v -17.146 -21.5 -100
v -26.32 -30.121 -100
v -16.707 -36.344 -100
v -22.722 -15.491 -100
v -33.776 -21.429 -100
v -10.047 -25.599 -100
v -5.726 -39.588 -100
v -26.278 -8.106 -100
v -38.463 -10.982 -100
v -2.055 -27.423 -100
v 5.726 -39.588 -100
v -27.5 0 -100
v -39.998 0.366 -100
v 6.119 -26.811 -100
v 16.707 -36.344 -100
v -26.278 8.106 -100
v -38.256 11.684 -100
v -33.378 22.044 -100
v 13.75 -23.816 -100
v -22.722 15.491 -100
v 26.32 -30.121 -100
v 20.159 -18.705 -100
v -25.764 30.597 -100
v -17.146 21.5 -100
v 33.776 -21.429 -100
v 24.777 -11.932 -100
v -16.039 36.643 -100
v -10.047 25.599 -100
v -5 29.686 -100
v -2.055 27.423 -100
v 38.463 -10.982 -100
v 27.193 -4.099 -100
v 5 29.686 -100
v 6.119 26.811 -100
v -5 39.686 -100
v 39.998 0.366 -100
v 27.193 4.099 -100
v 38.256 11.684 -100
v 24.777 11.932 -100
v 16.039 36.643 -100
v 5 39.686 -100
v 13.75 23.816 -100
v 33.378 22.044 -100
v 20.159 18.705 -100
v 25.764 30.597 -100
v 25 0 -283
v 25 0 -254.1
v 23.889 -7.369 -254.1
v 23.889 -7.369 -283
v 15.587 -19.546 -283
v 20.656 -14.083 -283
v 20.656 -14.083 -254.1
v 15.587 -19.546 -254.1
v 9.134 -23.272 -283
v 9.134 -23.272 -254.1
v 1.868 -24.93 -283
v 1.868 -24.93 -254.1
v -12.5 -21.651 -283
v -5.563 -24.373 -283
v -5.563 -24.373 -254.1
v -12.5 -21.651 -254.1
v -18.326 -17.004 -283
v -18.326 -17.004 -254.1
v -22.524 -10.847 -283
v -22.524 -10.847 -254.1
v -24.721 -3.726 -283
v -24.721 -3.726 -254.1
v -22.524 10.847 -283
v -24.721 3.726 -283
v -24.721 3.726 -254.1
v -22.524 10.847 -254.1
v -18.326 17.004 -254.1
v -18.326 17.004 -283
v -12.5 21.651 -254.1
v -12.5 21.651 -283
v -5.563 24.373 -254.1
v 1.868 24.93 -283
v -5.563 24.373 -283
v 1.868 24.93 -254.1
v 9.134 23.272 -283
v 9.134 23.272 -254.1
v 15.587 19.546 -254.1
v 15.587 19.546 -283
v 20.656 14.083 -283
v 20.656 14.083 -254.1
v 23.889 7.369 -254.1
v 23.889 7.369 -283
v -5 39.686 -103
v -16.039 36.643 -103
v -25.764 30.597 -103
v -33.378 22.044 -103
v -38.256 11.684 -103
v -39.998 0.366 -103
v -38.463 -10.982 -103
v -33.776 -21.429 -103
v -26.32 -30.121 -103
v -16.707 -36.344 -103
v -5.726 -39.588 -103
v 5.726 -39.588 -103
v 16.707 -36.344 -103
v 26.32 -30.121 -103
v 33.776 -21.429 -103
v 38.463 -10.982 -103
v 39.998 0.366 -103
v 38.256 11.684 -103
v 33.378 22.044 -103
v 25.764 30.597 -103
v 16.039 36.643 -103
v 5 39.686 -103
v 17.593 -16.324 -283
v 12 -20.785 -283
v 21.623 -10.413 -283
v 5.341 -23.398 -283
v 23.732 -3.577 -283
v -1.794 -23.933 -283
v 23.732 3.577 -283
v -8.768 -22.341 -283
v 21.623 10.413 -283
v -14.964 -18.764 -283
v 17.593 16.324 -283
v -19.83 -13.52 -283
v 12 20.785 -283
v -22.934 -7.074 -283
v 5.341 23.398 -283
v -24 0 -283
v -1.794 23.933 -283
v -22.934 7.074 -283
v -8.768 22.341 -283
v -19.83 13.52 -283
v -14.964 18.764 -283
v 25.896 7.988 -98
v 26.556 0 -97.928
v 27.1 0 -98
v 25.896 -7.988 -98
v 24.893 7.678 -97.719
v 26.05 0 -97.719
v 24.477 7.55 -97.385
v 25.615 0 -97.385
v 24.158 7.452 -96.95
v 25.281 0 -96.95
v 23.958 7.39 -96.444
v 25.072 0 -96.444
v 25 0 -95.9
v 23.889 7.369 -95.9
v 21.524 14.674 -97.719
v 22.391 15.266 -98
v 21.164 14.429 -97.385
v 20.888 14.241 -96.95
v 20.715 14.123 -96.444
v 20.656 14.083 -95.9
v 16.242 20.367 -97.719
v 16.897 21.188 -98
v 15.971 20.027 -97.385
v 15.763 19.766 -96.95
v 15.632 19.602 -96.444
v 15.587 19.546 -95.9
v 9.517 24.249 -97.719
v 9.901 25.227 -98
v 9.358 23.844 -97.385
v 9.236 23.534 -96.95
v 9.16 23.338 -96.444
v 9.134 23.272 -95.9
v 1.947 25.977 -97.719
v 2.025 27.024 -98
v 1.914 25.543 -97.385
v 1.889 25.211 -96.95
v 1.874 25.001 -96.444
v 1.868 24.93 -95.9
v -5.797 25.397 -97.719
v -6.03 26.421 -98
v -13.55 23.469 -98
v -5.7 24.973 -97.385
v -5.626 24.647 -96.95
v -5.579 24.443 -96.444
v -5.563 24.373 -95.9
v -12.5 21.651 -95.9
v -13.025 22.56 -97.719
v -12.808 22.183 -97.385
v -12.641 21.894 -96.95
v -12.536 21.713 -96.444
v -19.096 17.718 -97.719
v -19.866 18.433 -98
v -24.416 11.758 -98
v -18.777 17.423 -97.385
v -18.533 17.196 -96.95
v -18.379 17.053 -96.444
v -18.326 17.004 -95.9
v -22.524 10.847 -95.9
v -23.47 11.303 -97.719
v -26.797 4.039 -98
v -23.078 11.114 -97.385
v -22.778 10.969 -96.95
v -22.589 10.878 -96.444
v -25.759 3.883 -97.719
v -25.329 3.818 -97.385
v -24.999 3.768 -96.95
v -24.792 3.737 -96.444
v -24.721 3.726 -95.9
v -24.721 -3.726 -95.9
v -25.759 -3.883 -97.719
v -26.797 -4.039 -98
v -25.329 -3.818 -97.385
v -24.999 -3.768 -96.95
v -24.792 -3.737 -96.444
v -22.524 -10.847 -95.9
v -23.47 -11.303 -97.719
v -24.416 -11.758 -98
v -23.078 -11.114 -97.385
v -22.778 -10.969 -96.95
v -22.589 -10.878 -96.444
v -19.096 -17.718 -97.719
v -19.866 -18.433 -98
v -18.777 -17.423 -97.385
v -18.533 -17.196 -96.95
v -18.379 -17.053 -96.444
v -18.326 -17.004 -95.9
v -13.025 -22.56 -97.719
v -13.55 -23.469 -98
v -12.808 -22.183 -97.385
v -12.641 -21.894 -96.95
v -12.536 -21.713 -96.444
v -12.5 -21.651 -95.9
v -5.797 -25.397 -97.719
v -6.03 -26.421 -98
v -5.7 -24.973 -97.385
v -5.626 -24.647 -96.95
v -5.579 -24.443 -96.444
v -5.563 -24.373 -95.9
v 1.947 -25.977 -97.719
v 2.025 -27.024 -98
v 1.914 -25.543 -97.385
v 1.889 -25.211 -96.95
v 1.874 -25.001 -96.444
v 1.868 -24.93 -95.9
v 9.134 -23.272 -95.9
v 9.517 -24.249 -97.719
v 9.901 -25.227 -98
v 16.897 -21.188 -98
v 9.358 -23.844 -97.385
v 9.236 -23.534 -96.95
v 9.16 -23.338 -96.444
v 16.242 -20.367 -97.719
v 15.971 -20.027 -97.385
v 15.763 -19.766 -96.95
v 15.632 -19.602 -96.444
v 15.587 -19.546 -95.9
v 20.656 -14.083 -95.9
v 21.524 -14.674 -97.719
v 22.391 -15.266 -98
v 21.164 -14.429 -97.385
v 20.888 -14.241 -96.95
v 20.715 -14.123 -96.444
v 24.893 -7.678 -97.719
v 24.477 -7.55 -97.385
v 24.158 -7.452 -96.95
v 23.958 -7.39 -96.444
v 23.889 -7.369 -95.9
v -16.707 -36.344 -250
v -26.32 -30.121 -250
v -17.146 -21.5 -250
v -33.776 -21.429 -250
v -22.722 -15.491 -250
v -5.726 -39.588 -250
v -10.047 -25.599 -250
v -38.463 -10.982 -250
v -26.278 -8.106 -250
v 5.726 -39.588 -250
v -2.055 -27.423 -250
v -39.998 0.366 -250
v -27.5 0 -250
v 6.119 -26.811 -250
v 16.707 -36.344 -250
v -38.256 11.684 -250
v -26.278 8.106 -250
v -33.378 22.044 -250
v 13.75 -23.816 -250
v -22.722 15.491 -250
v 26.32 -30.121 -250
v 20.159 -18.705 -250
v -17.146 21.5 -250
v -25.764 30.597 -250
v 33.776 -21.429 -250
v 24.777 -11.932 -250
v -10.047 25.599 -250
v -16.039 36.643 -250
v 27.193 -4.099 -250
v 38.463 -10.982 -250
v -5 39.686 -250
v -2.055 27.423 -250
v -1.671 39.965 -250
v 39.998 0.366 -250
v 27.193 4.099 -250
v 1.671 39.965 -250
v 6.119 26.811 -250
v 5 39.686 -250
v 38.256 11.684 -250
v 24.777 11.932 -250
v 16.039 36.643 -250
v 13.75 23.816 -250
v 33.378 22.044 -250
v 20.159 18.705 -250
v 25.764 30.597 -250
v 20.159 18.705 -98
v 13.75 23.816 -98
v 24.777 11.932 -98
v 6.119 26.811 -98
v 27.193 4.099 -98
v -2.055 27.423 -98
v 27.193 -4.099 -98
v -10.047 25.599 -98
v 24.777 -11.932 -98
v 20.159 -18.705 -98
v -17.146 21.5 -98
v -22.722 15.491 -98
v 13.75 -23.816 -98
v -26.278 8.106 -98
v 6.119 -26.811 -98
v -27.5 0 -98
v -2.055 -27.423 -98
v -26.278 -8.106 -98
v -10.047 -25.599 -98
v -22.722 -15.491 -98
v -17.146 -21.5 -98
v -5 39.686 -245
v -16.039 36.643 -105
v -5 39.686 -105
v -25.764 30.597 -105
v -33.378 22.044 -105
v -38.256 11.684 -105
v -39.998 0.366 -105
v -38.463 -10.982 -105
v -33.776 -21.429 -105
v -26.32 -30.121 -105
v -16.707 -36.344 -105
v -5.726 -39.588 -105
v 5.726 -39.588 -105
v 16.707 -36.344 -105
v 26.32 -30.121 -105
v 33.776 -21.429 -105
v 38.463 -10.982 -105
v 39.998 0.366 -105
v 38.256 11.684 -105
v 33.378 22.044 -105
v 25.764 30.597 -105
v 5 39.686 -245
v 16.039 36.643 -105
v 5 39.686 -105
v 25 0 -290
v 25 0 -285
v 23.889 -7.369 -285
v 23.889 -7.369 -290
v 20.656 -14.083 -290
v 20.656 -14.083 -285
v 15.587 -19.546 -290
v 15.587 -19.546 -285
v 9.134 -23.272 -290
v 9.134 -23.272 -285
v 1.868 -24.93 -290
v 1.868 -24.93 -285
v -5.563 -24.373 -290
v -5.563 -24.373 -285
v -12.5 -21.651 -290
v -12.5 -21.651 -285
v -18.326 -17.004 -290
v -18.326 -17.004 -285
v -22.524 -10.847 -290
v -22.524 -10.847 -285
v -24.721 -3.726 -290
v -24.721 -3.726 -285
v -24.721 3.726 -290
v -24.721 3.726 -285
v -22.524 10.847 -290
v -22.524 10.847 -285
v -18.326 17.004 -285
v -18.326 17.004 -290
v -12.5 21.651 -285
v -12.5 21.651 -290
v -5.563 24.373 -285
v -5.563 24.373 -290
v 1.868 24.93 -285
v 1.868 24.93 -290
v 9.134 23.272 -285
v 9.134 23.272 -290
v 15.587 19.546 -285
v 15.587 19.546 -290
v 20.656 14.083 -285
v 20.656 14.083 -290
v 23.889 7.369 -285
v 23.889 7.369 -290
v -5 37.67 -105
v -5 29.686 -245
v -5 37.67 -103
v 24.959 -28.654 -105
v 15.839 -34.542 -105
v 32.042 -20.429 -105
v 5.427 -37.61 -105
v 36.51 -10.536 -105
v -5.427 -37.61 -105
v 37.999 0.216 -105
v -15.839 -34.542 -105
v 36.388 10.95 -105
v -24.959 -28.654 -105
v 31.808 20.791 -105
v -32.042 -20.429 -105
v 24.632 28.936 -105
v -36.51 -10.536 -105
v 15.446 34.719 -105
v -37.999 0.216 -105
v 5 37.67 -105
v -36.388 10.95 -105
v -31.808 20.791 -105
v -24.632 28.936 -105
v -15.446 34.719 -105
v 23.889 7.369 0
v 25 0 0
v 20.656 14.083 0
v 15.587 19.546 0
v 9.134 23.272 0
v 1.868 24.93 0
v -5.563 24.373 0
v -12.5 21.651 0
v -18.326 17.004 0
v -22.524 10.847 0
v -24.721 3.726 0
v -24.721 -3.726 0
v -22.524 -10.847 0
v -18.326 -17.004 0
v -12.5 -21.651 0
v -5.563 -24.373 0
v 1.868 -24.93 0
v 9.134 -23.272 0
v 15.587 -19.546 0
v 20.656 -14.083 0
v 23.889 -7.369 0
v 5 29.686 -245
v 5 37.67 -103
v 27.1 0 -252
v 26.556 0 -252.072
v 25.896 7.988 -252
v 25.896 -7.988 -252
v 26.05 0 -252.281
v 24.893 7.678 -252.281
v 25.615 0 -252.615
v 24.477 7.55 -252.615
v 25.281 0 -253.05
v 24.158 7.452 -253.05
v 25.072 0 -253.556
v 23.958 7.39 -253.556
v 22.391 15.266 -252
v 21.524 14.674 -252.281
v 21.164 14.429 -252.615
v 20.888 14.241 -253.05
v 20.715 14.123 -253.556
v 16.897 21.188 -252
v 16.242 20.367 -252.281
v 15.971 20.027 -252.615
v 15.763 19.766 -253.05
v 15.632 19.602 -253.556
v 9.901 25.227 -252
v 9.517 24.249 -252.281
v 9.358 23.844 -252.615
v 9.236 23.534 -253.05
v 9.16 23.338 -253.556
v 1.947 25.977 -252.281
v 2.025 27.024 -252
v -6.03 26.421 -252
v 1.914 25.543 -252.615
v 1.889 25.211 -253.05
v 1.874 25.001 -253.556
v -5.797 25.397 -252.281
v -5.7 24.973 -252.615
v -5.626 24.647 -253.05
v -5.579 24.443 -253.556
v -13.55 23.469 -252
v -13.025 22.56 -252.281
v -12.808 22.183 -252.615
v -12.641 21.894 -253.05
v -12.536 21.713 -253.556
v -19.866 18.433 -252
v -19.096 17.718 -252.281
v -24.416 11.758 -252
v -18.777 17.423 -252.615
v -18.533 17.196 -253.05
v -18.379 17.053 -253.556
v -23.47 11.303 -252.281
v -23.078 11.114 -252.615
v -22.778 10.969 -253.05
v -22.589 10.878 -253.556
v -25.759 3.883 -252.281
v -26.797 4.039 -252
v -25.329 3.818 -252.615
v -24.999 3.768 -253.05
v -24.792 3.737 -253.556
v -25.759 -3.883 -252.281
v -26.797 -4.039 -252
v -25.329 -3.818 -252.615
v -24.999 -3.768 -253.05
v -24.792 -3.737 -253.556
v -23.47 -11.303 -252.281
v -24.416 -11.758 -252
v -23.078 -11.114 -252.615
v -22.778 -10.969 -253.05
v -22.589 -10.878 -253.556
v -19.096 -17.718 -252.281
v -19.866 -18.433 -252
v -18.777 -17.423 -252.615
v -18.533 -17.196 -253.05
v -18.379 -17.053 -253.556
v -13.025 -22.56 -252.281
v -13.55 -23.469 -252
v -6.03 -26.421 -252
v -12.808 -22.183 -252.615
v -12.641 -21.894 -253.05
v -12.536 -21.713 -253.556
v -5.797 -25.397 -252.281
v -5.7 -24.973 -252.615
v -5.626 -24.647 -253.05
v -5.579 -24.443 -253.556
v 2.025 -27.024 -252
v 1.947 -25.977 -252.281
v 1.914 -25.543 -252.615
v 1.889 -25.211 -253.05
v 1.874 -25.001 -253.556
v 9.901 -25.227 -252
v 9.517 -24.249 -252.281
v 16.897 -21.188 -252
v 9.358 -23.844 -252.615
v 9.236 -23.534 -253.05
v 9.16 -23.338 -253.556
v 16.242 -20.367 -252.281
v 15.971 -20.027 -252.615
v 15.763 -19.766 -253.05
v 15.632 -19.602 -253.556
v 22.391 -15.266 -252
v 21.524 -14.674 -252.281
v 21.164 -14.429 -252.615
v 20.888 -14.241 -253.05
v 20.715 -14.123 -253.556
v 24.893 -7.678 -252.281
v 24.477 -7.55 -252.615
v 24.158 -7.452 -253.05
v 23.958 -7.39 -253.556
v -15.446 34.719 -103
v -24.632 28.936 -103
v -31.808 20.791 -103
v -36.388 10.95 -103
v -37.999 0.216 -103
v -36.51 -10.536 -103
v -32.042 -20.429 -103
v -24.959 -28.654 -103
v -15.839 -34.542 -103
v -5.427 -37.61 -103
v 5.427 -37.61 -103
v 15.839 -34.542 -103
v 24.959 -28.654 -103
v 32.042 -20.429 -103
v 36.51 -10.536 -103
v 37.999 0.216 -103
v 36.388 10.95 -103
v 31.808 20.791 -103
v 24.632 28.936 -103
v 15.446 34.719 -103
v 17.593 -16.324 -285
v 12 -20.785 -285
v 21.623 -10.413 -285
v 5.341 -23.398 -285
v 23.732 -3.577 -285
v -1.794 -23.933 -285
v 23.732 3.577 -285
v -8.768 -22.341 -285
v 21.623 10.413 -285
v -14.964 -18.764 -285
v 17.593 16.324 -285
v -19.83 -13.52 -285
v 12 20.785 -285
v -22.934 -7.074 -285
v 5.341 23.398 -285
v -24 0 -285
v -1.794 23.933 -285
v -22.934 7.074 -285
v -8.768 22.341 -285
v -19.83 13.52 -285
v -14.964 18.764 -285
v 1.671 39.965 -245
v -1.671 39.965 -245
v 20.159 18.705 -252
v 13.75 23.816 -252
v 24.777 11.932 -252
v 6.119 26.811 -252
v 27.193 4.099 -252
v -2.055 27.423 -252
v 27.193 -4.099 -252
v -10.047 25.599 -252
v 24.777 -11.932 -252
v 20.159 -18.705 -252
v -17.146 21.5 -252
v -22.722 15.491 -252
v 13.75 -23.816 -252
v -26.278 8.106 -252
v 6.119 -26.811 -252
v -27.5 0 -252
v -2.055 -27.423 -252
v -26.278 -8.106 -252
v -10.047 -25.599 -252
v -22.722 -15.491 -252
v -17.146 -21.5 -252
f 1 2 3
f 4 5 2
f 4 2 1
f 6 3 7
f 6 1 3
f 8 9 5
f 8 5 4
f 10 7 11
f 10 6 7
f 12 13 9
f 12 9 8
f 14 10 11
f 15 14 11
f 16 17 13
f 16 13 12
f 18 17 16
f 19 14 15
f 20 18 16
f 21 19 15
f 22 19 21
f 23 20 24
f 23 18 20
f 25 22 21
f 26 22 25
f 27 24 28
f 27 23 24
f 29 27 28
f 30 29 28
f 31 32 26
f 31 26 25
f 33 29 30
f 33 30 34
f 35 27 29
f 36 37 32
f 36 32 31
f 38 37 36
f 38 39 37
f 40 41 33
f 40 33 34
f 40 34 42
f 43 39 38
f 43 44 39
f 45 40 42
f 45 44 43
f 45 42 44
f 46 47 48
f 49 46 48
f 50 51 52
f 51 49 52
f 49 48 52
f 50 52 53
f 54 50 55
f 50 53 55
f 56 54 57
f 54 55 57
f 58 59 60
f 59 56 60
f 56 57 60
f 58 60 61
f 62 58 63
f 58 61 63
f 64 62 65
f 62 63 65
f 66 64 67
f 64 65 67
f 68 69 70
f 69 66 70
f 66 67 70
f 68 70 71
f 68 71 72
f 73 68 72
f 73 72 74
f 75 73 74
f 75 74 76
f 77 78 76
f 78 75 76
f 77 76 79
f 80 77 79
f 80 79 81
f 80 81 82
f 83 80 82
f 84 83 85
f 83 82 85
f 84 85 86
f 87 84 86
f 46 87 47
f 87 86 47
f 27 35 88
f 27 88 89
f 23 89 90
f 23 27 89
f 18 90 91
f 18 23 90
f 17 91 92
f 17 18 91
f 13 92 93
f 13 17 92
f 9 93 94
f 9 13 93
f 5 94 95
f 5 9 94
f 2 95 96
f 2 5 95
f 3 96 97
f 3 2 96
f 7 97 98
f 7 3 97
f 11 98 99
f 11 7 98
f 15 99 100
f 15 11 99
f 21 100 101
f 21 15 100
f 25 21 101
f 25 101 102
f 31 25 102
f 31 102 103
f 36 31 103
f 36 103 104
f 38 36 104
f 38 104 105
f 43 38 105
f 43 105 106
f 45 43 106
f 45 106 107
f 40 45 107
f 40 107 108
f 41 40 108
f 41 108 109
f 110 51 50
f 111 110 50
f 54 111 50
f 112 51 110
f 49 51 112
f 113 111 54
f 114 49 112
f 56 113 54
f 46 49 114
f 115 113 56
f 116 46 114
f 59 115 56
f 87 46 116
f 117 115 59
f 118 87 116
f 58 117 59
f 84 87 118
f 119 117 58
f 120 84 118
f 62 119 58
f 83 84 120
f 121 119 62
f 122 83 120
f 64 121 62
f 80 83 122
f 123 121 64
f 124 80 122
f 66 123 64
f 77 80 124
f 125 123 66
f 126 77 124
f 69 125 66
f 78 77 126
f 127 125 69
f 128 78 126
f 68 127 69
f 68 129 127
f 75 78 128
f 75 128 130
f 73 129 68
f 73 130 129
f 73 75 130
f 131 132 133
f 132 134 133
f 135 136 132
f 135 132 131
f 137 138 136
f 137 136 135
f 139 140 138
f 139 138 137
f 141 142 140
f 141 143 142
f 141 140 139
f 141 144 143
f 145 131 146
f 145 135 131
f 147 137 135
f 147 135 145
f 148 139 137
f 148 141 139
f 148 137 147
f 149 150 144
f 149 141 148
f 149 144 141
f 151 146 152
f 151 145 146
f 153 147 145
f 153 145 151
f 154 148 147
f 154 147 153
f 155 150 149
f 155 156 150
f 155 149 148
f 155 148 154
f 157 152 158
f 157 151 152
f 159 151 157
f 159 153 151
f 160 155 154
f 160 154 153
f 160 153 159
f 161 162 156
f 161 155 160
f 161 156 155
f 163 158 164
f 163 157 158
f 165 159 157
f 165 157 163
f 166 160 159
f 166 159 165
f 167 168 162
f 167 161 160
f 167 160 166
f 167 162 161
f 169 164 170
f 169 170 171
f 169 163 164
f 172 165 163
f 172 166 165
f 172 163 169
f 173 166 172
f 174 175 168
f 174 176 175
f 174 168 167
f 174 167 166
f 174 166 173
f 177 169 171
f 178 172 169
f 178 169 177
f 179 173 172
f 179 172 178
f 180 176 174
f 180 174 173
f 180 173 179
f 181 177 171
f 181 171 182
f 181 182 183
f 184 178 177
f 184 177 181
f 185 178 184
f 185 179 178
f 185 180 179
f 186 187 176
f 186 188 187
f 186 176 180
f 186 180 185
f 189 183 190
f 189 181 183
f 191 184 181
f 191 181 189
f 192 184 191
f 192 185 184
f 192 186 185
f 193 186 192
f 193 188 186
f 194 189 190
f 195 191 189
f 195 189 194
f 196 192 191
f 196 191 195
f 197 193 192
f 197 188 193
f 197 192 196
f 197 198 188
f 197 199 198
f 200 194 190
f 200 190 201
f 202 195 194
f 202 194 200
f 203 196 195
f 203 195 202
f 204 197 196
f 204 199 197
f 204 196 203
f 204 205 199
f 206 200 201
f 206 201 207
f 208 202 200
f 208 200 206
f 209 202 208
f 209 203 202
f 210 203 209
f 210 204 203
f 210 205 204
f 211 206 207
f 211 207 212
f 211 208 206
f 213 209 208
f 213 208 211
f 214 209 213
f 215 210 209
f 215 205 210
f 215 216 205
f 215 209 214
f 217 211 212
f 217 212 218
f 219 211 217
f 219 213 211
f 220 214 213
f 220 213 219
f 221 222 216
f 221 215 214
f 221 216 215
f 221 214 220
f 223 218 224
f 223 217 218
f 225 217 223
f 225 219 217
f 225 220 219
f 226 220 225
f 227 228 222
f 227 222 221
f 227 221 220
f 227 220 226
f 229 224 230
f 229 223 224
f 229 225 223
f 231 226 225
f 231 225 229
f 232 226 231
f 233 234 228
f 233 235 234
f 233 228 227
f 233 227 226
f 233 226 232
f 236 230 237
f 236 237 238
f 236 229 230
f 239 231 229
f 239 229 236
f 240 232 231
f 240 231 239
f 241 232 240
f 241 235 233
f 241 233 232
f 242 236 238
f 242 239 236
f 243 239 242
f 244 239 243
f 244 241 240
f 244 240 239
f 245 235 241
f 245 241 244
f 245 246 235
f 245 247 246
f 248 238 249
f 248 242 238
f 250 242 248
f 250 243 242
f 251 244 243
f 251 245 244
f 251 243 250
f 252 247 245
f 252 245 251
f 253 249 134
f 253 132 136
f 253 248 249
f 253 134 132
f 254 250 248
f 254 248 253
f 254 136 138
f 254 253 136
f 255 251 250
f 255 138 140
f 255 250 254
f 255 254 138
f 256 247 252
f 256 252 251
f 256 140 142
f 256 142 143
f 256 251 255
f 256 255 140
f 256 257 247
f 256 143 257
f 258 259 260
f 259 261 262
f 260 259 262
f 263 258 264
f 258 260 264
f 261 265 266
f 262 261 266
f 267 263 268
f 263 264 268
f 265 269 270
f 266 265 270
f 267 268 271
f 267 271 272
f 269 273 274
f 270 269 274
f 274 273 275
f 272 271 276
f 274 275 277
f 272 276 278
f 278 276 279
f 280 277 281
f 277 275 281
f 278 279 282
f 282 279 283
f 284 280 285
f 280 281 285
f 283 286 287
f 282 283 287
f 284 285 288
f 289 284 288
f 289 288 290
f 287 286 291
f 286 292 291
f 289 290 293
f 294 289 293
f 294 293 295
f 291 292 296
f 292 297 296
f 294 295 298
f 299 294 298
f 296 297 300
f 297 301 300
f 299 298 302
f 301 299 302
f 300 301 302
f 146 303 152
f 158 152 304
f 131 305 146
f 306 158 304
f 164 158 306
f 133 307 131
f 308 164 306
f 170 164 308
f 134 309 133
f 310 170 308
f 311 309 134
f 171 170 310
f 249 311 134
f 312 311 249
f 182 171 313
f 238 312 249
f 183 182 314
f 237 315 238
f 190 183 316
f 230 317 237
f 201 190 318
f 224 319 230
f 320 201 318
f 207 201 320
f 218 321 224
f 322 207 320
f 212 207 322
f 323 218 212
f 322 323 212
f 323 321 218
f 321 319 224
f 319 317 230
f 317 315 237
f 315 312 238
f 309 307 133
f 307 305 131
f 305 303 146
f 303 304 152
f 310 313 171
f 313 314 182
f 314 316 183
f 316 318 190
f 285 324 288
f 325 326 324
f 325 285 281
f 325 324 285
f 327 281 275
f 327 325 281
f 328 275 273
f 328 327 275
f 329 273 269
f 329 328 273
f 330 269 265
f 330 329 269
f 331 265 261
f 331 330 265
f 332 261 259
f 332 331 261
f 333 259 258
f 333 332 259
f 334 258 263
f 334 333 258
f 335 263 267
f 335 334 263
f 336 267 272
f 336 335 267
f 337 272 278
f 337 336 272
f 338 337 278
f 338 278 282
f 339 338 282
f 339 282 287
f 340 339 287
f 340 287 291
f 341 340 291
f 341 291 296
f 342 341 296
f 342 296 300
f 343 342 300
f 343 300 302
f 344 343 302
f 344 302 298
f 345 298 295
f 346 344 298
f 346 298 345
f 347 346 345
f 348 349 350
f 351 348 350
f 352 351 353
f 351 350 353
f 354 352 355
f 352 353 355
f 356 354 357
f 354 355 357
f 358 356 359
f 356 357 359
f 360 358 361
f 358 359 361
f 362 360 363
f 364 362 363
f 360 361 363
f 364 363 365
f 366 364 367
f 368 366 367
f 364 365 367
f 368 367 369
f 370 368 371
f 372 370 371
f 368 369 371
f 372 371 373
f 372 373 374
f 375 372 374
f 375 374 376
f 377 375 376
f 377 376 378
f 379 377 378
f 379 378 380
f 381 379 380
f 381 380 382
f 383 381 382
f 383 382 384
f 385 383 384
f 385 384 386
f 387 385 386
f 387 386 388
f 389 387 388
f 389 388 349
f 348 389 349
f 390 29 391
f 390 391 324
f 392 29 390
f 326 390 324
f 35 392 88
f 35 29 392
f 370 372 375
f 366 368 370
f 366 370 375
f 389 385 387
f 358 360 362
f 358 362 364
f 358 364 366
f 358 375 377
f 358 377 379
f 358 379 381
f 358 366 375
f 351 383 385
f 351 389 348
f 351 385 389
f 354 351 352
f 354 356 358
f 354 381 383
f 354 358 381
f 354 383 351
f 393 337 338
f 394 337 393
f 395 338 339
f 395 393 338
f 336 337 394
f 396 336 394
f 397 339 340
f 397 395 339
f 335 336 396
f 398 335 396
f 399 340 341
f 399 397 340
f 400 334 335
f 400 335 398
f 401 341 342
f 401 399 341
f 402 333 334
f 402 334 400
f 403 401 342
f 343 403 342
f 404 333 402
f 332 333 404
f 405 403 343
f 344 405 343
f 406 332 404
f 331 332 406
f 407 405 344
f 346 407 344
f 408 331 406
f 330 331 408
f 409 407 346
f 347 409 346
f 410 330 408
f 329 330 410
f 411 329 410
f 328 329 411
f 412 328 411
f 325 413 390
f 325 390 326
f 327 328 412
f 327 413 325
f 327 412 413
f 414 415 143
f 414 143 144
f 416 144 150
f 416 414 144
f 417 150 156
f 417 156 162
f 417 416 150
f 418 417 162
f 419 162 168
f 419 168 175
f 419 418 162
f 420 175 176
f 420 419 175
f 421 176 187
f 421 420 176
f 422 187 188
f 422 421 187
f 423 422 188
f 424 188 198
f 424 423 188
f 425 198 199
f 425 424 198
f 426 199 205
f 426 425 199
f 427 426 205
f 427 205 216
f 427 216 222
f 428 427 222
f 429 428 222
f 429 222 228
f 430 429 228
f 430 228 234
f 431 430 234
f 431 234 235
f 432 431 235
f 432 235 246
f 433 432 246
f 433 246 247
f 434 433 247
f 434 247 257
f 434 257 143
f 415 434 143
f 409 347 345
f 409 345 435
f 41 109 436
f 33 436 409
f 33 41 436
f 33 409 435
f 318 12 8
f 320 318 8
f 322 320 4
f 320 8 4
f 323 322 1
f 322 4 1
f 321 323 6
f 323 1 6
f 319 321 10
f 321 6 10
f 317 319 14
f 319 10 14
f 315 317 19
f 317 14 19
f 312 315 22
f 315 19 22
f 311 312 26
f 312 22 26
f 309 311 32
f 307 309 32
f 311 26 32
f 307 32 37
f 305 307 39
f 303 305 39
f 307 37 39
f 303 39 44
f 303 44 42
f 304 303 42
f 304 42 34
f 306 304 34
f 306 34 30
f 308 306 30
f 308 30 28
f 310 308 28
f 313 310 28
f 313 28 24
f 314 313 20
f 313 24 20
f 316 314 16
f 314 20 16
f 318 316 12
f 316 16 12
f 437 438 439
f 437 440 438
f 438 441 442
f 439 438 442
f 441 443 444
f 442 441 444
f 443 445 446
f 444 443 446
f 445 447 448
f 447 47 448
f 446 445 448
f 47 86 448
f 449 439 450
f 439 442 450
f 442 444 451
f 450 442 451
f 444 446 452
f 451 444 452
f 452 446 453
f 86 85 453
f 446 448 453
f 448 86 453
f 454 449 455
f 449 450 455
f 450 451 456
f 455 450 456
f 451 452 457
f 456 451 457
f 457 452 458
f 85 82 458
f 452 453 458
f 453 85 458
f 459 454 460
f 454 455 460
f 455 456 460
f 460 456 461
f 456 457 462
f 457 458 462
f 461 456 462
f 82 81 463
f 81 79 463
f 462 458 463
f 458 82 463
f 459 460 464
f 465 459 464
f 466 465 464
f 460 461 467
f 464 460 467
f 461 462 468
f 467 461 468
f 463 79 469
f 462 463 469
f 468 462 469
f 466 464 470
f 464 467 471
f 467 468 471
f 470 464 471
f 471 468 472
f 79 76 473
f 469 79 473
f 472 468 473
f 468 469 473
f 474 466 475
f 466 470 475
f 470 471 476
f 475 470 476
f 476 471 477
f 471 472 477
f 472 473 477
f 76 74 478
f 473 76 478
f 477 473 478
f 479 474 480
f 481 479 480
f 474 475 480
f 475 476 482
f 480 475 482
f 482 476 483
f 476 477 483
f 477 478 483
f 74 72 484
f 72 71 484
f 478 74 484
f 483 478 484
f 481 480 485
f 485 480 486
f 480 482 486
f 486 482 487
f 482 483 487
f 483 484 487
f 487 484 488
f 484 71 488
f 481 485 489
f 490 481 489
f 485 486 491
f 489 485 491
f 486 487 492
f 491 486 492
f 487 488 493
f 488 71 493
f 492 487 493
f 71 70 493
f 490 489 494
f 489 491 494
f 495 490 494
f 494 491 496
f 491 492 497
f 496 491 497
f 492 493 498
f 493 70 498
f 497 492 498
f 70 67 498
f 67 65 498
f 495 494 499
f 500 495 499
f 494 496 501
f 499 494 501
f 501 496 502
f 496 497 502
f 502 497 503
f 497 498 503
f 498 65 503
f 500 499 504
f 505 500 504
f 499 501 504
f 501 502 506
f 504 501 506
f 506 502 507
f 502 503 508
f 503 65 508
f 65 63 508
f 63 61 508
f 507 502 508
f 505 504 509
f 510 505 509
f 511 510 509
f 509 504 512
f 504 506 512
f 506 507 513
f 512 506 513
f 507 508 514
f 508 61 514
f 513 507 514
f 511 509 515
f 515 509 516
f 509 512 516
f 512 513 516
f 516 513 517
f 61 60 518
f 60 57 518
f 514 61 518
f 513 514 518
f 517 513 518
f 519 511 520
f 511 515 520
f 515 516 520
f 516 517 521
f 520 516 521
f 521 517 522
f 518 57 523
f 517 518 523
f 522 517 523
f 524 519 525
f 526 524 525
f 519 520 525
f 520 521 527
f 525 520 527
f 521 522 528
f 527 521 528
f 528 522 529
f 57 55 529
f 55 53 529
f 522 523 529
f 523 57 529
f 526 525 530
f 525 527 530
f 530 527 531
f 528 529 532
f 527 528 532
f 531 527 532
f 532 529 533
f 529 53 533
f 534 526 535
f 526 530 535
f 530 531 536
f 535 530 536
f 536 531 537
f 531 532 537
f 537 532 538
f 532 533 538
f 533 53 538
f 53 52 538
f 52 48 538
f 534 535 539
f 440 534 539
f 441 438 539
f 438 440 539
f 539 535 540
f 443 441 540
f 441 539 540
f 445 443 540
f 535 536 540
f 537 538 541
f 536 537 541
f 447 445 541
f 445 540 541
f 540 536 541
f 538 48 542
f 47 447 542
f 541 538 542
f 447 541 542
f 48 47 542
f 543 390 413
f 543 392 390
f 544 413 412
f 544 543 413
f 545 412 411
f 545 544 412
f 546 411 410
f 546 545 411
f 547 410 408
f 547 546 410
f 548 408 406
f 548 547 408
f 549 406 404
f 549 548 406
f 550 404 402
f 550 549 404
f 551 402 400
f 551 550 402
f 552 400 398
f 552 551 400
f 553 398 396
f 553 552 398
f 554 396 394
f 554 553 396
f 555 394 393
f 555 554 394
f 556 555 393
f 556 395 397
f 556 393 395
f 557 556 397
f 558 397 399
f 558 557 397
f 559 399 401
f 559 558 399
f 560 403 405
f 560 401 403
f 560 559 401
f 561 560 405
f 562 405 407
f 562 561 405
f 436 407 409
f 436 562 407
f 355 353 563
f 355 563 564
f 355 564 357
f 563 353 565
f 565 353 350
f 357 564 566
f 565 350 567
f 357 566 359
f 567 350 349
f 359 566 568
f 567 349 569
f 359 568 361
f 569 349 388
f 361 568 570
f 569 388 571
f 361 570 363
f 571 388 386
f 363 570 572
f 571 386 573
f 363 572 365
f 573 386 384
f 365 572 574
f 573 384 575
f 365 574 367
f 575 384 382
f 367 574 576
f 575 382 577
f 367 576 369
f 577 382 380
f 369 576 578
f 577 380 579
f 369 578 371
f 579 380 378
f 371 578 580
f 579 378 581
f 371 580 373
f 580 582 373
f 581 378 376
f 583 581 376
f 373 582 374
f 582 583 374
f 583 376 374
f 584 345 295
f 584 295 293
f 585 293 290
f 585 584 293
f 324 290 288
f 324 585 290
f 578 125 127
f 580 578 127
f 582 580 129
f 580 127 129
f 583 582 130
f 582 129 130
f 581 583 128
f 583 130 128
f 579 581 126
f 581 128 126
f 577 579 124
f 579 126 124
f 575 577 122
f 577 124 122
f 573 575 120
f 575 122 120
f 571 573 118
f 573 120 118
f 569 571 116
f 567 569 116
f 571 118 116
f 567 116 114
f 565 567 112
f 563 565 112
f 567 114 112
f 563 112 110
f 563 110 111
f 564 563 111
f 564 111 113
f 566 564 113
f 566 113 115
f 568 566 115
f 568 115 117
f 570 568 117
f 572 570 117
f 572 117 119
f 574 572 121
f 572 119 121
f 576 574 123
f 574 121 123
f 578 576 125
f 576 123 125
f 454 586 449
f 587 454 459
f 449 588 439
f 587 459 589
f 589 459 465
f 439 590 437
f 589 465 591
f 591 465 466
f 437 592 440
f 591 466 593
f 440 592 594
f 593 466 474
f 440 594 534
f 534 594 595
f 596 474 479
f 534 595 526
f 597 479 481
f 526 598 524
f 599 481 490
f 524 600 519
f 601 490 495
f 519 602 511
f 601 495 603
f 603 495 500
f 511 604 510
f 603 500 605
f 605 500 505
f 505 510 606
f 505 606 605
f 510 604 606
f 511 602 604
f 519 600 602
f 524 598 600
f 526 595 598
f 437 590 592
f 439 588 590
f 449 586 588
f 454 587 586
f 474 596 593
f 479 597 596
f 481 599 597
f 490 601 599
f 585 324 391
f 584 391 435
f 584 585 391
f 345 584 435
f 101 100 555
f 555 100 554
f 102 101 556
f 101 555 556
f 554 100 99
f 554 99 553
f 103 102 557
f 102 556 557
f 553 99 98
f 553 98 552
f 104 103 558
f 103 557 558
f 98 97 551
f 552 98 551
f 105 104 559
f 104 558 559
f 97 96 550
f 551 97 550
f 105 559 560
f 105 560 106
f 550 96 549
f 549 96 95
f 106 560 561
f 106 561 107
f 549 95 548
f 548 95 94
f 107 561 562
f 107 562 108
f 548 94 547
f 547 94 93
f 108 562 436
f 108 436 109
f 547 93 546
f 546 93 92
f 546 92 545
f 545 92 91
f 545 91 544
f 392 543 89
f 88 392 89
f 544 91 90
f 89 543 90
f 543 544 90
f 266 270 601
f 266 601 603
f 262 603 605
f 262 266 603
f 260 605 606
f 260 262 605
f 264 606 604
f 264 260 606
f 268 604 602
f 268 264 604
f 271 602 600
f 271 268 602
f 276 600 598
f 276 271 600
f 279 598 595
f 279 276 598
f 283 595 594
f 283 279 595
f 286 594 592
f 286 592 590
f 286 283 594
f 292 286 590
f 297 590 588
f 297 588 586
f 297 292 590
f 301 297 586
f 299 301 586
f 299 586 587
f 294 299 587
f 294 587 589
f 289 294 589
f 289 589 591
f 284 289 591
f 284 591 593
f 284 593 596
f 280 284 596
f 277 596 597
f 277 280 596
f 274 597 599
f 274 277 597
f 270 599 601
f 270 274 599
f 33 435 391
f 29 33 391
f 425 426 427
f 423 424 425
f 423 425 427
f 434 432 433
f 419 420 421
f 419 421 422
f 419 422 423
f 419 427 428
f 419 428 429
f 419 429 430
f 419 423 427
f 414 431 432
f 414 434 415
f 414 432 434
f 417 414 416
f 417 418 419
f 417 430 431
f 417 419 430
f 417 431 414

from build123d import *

# Parameters (mm, degrees)
ESQUISSE1_R             = 25
BOSS_EXTRU_1_DEPTH      = 100
BOSS_EXTRU_3_DEPTH      = 150
ESQUISSE5_R             = 25
BOSS_EXTRU_4_DEPTH      = 40
ESQUISSE6_R             = 27.5
BOSS_EXTRU_5_DEPTH      = 2
CONG_2_R                = 2.1
CONG_3_R                = 2.1
ESQUISSE7_R             = 25
ESQUISSE7_R_2           = 24
ENL_V_MAT_EXTRU_1_DEPTH = 2
BOSS_EXTRU_6_START      = -5
BOSS_EXTRU_6_DEPTH      = 5
ENL_V_START             = 2
ESQUISSE10_R            = 40
ESQUISSE10_R_2          = 38
ENL_V_MAT_EXTRU_2_DEPTH = 2


with BuildPart() as part:
    # Esquisse1 → Boss.-Extru.1 (new body)
    with BuildSketch(Plane.XY):
        Circle(ESQUISSE1_R)
    extrude(amount=-BOSS_EXTRU_1_DEPTH)

    # Esquisse4 → Boss.-Extru.3 (add)
    with BuildSketch(Plane(origin=(0, 0, -100), x_dir=(-1, 0, 0), z_dir=(0, 0, -1))):
        with BuildLine():
            Line((-5, 39.686269666), (-5, 29.686269666))
            Line((-5, 29.686269666), (5, 29.686269666))
            Line((5, 29.686269666), (5, 39.686269666))
            ThreePointArc((5, 39.686269666), (0, -40), (-5, 39.686269666))
        make_face()
    extrude(amount=BOSS_EXTRU_3_DEPTH)

    # Esquisse5 → Boss.-Extru.4 (add)
    with BuildSketch(Plane(origin=(0, 0, -250), x_dir=(-1, 0, 0), z_dir=(0, 0, -1))):
        with Locations(Location((0, 0, 0), (0, 0, 180))):
            Circle(ESQUISSE5_R)
    extrude(amount=BOSS_EXTRU_4_DEPTH)

    # Esquisse6 → Boss.-Extru.5 (add)
    with BuildSketch(Plane.XY.offset(-100)):
        with Locations(Location((0, 0, 0), (0, 0, 180))):
            Circle(ESQUISSE6_R)
    boss_extru_5 = extrude(amount=BOSS_EXTRU_5_DEPTH)

    # Congé2
    cong_2_edges = [part.edges().sort_by_distance(p)[0] for p in [
        (-25, 0, -98),
    ]]
    fillet(cong_2_edges, radius=CONG_2_R)

    # Symétrie3: Boss.-Extru.5 across plane
    add(boss_extru_5.mirror(Plane.XY.offset(-175)))

    # Congé3
    cong_3_edges = [part.edges().sort_by_distance(p)[0] for p in [
        (-25, 0, -252),
    ]]
    fillet(cong_3_edges, radius=CONG_3_R)

    # Esquisse7 → Enlèv. mat.-Extru.1 (cut)
    with BuildSketch(Plane(origin=(0, 0, -283), x_dir=(-1, 0, 0), z_dir=(0, 0, -1))):
        Circle(ESQUISSE7_R)
        Circle(ESQUISSE7_R_2, mode=Mode.SUBTRACT)
    extrude(amount=ENL_V_MAT_EXTRU_1_DEPTH, mode=Mode.SUBTRACT)

    # Esquisse9 → Boss.-Extru.6 (add)
    with BuildSketch(Plane(origin=(0, 0, -250), x_dir=(-1, 0, 0), z_dir=(0, 0, -1)).offset(BOSS_EXTRU_6_START)):
        with BuildLine():
            ThreePointArc((-5, 39.686269666), (0, 40), (5, 39.686269666))
            Line((5, 39.686269666), (5, 29.686269666))
            Line((5, 29.686269666), (-5, 29.686269666))
            Line((-5, 29.686269666), (-5, 39.686269666))
        make_face()
    extrude(amount=BOSS_EXTRU_6_DEPTH)

    # Esquisse10 → Enlèv. mat.-Extru.2 (cut)
    with BuildSketch(Plane.XY.offset(-105).offset(ENL_V_START)):
        with Locations(Location((0, 0, 0), (0, 0, 82.819244219))):
            Circle(ESQUISSE10_R)
        Circle(ESQUISSE10_R_2, mode=Mode.SUBTRACT)
    extrude(amount=-ENL_V_MAT_EXTRU_2_DEPTH, mode=Mode.SUBTRACT)


solid = part.part
